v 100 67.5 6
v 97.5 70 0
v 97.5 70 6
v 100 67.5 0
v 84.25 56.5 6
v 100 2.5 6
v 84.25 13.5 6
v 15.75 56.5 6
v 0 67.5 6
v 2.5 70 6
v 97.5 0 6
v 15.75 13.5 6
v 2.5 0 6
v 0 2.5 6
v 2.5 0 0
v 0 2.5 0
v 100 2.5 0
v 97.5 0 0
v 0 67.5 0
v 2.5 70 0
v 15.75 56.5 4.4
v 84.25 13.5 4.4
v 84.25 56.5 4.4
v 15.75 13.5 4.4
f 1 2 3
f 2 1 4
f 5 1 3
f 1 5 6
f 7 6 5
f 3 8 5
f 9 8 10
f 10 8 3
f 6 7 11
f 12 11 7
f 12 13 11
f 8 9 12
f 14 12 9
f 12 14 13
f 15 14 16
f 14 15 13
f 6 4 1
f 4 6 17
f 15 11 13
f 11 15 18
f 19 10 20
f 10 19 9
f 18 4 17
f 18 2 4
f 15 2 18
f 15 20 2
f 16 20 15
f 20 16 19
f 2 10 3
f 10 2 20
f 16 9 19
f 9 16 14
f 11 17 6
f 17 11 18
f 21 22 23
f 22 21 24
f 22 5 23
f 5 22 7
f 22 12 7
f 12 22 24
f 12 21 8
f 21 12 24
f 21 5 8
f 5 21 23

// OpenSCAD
$fn = 32;

// ----------------------------------------------------------------------
// Windowed plate: 1 voids, 100 x 70 x 6 mm
// ----------------------------------------------------------------------

// --- parameters (mm) ---
plate_l = 100;            // plate length, X
plate_w = 70;             // plate width, Y
plate_t = 6;              // plate thickness, Z
edge_margin = 10;         // wall from the plate edge to any window
win1_l = 68.5;            // window length
win1_w = 43;              // window width
depth_1 = 1.6;            // depth of void 1 (full thickness = through)
corner_c = 2.5;           // corner chamfer of the plate
fit_tol = 0.05;           // declared fit tolerance (prompt contract)
free_tol = 0.3;           // declared free tolerance (prompt contract)

profile = [[2.5, 0], [97.5, 0], [100, 2.5], [100, 67.5], [97.5, 70], [2.5, 70], [0, 67.5], [0, 2.5]];  // primary outline, 8 points, counter clockwise
void_1 = [[15.75, 13.5], [84.25, 13.5], [84.25, 56.5], [15.75, 56.5]];  // large central window, 4 points

// --- the one profile operation ---
difference() {
  linear_extrude(height = plate_t) polygon(points = profile);
  translate([0, 0, plate_t - depth_1])
    linear_extrude(height = depth_1 + 1) polygon(points = void_1);
}
